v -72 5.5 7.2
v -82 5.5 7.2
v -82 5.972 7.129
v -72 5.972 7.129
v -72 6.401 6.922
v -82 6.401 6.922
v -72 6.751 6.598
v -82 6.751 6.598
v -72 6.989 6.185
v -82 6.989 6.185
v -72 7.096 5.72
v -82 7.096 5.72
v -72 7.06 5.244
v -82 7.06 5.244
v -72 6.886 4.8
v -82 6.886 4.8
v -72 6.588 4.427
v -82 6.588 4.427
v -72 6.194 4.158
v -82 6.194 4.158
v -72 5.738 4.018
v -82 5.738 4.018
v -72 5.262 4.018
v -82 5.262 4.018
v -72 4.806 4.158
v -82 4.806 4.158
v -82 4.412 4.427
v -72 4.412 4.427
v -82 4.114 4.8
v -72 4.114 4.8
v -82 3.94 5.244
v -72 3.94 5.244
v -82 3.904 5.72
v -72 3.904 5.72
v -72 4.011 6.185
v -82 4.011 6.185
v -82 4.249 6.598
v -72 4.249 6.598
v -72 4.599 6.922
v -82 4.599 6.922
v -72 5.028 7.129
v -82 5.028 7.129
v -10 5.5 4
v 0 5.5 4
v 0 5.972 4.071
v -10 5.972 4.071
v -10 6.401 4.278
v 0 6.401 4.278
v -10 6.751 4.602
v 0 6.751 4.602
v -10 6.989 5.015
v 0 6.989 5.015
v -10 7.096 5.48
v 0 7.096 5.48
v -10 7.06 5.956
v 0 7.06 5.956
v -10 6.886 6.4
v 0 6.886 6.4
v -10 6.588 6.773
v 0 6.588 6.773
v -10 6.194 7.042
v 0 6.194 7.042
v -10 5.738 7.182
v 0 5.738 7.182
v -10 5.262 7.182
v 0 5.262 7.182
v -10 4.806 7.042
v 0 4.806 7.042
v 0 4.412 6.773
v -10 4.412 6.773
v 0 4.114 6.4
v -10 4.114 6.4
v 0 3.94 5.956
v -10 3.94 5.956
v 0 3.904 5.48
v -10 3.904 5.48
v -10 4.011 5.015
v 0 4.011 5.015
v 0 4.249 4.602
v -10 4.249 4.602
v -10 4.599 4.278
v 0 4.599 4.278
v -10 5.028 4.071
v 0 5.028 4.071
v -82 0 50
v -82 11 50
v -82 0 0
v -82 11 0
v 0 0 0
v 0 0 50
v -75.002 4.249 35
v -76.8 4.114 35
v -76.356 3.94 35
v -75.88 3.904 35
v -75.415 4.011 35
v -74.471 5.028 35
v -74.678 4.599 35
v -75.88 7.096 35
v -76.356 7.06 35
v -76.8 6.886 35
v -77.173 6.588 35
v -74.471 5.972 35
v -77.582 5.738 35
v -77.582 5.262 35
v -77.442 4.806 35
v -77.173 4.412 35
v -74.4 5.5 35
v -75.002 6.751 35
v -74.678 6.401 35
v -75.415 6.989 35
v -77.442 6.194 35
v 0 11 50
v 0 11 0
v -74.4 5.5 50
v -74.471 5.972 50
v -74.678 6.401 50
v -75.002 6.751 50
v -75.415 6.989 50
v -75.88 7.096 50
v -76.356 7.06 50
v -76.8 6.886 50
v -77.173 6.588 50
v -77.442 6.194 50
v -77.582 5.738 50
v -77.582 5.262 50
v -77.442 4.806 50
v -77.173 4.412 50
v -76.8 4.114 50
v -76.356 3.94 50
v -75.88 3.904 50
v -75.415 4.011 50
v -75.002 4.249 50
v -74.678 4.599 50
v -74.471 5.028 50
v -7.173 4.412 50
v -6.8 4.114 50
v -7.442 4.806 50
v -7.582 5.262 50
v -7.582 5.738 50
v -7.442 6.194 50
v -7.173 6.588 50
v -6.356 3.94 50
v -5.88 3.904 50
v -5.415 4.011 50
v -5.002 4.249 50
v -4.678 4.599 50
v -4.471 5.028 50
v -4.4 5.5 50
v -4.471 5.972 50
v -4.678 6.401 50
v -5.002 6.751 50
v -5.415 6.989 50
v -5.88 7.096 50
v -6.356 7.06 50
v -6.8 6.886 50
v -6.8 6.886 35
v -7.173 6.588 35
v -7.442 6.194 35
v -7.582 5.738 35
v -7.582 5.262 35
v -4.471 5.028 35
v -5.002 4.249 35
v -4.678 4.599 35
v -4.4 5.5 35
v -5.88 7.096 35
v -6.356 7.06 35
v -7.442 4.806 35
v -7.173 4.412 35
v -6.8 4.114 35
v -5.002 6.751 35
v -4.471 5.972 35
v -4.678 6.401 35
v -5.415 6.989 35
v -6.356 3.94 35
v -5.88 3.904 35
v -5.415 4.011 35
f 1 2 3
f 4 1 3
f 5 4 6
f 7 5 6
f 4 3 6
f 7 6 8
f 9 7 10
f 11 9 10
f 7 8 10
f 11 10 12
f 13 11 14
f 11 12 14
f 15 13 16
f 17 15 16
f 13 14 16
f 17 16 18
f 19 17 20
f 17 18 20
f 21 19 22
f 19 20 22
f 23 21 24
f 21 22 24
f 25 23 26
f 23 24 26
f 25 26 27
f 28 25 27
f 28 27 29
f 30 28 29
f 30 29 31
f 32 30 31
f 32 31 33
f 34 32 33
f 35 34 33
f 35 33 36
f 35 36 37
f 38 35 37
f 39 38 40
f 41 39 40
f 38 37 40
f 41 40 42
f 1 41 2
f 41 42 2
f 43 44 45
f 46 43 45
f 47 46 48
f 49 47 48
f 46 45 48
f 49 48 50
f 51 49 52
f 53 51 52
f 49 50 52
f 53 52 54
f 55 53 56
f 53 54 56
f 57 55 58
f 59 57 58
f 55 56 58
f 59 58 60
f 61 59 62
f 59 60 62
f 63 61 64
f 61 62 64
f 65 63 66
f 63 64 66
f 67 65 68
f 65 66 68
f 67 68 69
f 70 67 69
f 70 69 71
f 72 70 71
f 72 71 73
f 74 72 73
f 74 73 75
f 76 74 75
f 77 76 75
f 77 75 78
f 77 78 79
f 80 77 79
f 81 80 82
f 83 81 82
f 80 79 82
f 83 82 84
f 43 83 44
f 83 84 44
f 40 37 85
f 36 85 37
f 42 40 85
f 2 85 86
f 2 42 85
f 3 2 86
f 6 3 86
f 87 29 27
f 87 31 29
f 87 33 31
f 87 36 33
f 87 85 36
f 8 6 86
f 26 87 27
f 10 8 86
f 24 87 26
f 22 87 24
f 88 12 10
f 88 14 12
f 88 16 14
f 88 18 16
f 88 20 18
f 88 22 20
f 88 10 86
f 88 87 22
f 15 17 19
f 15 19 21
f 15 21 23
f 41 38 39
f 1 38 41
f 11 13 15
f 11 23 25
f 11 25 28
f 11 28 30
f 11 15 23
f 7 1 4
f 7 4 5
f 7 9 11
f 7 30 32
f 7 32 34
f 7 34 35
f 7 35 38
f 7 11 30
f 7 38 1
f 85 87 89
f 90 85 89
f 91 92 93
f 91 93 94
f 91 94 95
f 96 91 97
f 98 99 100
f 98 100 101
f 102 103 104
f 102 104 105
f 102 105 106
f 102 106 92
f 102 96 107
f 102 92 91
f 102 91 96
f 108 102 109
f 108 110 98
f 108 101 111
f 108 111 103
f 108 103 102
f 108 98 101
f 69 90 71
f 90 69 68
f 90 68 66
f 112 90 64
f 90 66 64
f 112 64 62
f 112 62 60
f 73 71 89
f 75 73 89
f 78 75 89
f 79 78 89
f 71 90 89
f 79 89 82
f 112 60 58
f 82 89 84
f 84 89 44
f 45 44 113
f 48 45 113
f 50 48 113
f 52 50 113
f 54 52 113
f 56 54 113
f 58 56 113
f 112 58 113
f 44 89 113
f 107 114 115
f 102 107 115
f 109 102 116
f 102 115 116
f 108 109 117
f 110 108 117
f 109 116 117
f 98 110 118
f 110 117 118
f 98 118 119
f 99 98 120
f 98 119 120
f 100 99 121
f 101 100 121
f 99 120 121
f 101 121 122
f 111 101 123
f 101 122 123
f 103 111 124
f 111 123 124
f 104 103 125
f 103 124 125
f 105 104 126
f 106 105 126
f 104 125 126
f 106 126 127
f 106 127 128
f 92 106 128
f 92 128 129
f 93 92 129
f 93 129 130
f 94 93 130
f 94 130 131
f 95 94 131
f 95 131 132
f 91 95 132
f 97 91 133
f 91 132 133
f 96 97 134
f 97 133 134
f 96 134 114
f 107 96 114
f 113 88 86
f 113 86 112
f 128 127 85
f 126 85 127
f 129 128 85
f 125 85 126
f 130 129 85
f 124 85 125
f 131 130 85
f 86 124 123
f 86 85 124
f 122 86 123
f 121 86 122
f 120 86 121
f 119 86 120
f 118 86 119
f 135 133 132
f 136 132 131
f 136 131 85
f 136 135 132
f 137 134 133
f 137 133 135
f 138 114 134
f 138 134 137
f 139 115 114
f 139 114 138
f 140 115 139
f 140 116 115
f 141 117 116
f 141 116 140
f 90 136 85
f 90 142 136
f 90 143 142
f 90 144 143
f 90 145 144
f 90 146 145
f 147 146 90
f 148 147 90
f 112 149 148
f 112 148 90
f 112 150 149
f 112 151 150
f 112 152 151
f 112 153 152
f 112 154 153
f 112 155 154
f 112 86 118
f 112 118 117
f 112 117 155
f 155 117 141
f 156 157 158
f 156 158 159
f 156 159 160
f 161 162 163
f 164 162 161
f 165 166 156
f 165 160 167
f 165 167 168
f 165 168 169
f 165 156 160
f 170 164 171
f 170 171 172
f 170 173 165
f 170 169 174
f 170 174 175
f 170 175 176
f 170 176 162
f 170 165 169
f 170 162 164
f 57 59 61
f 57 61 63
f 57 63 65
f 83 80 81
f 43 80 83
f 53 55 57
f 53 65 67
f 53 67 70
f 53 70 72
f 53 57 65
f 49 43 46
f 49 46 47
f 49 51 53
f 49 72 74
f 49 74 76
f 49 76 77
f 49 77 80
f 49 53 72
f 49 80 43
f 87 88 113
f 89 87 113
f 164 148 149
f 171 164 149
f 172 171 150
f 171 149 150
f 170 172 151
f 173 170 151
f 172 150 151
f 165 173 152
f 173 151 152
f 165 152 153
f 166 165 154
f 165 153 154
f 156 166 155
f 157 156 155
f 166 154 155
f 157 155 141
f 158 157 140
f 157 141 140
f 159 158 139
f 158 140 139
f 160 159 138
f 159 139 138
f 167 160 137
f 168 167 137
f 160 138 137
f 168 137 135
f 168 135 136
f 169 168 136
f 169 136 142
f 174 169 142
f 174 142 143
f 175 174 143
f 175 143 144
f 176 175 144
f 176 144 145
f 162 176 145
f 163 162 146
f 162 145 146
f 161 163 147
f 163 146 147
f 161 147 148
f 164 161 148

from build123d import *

# Parameters (mm, degrees)
SKETCH1_W           = 82
SKETCH1_H           = 11
BOSS_EXTRUDE1_DEPTH = 50
SKETCH2_R           = 1.6
CUT_EXTRUDE1_DEPTH  = 10
SKETCH3_R           = 1.6
CUT_EXTRUDE2_DEPTH  = 10
SKETCH4_R           = 1.6
CUT_EXTRUDE3_DEPTH  = 15


with BuildPart() as part:
    # Sketch1 → Boss-Extrude1 (new body)
    with BuildSketch(Plane.XY):
        with Locations((-41, 5.5)):
            Rectangle(SKETCH1_W, SKETCH1_H)
    extrude(amount=BOSS_EXTRUDE1_DEPTH)

    # Sketch2 → Cut-Extrude1 (cut)
    with BuildSketch(Plane(origin=(0, 0, 0), x_dir=(0, 0, -1), z_dir=(1, 0, 0))):
        with Locations((-5.6, 5.5)):
            Circle(SKETCH2_R)
    extrude(amount=-CUT_EXTRUDE1_DEPTH, mode=Mode.SUBTRACT)

    # Sketch3 → Cut-Extrude2 (cut)
    with BuildSketch(Plane.ZY.offset(82)):
        with Locations((5.6, 5.5)):
            Circle(SKETCH3_R)
    extrude(amount=-CUT_EXTRUDE2_DEPTH, mode=Mode.SUBTRACT)

    # Sketch4 → Cut-Extrude3 (cut)
    with BuildSketch(Plane.XY.offset(50)):
        with Locations((-76, 5.5)):
            Circle(SKETCH4_R)
        with Locations((-6, 5.5)):
            Circle(SKETCH4_R)
    extrude(amount=-CUT_EXTRUDE3_DEPTH, mode=Mode.SUBTRACT)


solid = part.part
